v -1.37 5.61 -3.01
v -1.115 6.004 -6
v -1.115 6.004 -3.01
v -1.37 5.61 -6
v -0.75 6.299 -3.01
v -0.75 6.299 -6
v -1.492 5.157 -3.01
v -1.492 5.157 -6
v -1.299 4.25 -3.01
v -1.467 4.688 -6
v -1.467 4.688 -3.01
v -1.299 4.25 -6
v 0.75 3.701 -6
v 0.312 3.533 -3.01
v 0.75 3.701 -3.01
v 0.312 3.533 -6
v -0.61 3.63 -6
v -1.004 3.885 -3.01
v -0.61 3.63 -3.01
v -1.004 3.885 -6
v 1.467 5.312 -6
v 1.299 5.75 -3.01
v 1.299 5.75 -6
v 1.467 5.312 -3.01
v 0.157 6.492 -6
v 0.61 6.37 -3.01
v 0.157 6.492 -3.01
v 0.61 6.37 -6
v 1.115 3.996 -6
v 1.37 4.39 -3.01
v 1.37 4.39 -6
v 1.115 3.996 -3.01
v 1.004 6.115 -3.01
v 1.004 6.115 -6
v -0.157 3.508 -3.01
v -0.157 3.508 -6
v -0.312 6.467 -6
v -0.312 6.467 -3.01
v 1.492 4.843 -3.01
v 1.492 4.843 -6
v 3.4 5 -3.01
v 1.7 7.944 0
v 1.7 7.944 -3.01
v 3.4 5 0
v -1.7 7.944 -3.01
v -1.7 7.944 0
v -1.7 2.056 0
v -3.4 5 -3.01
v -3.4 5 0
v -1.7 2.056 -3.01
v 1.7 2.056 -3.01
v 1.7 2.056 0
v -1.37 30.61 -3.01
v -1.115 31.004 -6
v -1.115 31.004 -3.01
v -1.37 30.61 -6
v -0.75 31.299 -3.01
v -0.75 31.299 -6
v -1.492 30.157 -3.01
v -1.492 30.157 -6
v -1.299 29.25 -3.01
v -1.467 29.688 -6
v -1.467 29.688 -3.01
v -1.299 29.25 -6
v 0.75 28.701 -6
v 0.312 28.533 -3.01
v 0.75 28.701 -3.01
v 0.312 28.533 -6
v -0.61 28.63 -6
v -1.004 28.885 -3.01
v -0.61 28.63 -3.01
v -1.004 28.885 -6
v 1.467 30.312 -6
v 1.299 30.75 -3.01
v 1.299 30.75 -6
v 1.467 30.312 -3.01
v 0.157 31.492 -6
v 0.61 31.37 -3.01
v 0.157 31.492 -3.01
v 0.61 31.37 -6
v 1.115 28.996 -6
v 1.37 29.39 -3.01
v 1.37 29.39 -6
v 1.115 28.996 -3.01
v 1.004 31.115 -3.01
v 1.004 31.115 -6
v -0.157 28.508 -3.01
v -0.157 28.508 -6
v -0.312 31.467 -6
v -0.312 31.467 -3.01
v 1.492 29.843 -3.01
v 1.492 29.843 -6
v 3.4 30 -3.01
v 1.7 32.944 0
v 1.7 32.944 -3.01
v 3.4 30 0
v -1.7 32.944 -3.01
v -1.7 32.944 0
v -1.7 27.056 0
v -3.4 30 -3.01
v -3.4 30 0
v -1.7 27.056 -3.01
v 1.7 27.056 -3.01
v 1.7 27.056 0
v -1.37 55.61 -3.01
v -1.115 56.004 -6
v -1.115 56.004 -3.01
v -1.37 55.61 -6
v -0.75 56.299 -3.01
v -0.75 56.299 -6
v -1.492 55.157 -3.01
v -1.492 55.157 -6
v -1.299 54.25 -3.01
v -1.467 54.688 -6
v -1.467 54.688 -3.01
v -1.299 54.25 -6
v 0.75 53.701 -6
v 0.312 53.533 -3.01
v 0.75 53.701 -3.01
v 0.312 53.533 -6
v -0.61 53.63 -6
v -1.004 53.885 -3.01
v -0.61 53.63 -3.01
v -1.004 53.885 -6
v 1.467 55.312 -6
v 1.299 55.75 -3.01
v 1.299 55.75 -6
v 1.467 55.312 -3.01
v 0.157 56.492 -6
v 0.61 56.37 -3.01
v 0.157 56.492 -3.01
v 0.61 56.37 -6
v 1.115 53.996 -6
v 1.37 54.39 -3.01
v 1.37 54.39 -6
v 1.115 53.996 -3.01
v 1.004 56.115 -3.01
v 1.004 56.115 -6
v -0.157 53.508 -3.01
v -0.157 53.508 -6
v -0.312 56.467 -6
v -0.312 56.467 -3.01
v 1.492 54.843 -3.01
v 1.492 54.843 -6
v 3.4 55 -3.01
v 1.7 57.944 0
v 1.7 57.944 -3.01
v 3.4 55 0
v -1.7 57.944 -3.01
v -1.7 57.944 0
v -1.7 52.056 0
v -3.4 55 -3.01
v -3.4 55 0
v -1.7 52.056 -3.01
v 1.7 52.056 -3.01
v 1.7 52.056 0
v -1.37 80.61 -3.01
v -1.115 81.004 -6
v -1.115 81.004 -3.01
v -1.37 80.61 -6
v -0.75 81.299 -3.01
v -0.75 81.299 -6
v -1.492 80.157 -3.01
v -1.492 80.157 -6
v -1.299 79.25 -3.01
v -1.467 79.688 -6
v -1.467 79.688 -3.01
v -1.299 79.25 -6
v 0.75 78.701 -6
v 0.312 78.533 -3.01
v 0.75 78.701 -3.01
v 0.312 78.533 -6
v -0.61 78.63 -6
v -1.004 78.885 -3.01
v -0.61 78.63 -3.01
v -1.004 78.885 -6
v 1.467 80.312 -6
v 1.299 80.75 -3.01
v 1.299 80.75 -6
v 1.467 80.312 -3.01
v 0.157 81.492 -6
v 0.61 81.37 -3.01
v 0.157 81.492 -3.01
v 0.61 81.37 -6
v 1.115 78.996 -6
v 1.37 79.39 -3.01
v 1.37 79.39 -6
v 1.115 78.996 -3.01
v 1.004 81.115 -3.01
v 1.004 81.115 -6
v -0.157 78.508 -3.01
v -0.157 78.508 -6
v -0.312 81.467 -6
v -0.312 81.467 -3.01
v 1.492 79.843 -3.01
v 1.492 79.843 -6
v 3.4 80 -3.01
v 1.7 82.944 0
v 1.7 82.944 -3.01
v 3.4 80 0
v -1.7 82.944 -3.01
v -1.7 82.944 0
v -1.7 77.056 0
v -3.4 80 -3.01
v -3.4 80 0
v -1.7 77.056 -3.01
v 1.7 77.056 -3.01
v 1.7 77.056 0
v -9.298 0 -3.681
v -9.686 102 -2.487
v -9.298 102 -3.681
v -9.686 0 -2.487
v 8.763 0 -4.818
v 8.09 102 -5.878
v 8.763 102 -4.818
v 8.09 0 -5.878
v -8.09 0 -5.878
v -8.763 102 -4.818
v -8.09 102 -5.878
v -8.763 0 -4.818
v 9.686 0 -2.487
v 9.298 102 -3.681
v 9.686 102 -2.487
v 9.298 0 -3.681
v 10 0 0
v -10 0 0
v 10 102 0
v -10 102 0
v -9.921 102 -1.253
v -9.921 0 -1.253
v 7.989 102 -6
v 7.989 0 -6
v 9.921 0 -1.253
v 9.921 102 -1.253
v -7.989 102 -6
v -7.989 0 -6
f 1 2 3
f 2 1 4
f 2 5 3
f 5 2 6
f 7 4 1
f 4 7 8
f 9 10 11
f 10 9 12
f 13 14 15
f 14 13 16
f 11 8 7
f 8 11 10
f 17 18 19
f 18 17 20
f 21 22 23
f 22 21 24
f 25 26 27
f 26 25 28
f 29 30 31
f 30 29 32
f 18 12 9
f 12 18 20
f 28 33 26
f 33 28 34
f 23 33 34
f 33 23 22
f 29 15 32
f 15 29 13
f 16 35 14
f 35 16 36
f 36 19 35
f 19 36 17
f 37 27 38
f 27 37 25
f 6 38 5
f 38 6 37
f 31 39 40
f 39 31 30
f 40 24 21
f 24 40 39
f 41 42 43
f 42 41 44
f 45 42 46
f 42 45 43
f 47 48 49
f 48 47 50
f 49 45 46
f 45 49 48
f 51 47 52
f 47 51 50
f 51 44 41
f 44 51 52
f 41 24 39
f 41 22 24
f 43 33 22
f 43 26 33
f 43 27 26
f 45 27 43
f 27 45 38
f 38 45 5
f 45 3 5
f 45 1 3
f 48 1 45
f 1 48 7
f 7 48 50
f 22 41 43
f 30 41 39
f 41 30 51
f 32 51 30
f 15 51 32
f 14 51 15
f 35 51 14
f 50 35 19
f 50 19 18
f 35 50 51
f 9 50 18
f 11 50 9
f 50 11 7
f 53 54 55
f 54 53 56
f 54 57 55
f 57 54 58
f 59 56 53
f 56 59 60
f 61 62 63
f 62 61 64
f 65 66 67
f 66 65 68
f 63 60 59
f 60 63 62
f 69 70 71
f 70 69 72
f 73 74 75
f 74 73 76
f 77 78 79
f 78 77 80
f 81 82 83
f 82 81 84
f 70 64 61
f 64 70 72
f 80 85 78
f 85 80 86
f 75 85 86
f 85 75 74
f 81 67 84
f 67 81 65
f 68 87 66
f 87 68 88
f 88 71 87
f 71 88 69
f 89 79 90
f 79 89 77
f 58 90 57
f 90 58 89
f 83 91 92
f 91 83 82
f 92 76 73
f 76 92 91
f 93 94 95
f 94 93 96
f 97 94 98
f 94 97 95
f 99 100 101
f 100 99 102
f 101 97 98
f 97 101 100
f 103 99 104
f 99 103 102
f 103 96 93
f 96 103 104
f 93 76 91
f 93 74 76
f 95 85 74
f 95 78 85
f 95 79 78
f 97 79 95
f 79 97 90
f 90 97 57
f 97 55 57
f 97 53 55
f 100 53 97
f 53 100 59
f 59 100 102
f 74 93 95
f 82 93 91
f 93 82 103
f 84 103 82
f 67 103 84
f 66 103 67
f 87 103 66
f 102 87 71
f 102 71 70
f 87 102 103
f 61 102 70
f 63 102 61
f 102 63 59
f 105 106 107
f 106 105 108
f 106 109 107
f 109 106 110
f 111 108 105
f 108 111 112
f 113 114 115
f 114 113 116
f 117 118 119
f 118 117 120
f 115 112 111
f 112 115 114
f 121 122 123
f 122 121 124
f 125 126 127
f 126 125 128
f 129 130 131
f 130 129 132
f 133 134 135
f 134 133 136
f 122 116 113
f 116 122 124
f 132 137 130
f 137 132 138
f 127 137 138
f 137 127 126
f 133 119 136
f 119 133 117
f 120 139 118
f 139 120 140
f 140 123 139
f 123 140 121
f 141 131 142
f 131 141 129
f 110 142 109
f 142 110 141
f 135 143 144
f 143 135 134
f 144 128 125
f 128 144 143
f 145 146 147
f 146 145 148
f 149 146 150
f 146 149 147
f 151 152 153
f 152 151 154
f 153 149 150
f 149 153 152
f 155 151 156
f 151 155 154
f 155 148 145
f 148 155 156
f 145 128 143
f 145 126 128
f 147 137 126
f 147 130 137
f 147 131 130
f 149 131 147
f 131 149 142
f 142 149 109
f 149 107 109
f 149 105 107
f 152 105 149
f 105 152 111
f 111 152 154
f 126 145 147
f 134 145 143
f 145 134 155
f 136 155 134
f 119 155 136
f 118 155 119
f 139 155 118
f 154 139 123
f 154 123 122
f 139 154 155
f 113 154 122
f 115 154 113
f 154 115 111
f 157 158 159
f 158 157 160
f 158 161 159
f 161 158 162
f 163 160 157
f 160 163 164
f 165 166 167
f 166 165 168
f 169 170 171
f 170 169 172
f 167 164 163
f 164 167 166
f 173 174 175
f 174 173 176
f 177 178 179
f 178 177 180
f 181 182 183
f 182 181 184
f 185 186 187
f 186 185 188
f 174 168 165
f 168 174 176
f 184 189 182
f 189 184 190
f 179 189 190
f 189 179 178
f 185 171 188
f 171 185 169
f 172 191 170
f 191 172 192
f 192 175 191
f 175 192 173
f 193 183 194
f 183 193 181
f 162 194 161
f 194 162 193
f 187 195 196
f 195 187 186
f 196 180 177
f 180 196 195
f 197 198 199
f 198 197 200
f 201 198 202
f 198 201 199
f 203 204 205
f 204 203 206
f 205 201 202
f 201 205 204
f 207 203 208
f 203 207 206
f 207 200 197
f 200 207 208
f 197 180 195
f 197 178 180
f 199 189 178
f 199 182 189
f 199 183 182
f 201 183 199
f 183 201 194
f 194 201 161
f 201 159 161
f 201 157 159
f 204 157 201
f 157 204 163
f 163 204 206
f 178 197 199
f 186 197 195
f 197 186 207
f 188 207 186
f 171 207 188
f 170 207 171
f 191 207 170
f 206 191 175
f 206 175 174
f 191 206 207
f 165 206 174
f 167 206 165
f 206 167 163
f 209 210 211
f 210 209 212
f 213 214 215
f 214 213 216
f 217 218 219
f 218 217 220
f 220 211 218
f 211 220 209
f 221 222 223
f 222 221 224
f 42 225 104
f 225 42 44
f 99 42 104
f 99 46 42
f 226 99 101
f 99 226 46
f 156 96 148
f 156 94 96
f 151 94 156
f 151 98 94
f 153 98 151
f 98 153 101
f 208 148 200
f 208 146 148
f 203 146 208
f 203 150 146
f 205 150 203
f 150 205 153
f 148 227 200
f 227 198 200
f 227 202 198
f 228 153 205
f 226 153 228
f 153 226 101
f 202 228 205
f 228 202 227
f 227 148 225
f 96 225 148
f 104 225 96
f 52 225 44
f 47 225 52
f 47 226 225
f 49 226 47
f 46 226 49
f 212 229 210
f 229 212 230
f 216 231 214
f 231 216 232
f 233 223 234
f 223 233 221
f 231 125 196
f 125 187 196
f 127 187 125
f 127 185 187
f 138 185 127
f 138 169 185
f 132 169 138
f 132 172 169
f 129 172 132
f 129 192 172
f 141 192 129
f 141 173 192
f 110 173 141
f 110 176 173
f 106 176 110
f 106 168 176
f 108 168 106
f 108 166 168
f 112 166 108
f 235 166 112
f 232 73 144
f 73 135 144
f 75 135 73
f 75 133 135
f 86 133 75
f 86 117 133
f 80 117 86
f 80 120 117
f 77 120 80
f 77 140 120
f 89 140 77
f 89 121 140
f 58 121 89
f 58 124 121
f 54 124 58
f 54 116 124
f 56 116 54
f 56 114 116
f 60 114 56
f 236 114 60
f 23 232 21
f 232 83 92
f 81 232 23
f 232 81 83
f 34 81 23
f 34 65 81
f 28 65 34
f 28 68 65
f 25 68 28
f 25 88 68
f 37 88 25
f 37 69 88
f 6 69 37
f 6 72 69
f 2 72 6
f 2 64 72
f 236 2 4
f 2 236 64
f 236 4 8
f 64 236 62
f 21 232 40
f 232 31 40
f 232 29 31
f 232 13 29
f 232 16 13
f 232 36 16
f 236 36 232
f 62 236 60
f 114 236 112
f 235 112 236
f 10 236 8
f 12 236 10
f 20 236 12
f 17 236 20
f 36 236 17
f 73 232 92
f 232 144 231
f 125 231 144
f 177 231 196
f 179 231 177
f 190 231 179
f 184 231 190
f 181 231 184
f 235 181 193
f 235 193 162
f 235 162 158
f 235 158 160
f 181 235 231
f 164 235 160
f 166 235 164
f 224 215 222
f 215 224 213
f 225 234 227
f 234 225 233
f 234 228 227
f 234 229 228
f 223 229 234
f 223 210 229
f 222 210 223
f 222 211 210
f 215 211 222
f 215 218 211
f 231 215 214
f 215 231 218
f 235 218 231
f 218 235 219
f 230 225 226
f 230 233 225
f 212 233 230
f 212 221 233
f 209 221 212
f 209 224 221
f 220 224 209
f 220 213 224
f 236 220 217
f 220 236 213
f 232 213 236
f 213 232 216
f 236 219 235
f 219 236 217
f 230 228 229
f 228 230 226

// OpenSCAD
rotate([0,0,90]) difference(){
  rotate([-90,0,-90]) linear_extrude(102) intersection() {
    circle(d=20,$fn=50);
    translate([-20,0]) square([40,6]);
  }
  for(x=[5,30,55,80]) translate([x,0,-8.01]) rotate([0,0,30]) {
    cylinder(d=3,h=10,$fn=20);
    translate([0,0,5]) cylinder(d=6.8,$fn=6,h=4);
  }
}
